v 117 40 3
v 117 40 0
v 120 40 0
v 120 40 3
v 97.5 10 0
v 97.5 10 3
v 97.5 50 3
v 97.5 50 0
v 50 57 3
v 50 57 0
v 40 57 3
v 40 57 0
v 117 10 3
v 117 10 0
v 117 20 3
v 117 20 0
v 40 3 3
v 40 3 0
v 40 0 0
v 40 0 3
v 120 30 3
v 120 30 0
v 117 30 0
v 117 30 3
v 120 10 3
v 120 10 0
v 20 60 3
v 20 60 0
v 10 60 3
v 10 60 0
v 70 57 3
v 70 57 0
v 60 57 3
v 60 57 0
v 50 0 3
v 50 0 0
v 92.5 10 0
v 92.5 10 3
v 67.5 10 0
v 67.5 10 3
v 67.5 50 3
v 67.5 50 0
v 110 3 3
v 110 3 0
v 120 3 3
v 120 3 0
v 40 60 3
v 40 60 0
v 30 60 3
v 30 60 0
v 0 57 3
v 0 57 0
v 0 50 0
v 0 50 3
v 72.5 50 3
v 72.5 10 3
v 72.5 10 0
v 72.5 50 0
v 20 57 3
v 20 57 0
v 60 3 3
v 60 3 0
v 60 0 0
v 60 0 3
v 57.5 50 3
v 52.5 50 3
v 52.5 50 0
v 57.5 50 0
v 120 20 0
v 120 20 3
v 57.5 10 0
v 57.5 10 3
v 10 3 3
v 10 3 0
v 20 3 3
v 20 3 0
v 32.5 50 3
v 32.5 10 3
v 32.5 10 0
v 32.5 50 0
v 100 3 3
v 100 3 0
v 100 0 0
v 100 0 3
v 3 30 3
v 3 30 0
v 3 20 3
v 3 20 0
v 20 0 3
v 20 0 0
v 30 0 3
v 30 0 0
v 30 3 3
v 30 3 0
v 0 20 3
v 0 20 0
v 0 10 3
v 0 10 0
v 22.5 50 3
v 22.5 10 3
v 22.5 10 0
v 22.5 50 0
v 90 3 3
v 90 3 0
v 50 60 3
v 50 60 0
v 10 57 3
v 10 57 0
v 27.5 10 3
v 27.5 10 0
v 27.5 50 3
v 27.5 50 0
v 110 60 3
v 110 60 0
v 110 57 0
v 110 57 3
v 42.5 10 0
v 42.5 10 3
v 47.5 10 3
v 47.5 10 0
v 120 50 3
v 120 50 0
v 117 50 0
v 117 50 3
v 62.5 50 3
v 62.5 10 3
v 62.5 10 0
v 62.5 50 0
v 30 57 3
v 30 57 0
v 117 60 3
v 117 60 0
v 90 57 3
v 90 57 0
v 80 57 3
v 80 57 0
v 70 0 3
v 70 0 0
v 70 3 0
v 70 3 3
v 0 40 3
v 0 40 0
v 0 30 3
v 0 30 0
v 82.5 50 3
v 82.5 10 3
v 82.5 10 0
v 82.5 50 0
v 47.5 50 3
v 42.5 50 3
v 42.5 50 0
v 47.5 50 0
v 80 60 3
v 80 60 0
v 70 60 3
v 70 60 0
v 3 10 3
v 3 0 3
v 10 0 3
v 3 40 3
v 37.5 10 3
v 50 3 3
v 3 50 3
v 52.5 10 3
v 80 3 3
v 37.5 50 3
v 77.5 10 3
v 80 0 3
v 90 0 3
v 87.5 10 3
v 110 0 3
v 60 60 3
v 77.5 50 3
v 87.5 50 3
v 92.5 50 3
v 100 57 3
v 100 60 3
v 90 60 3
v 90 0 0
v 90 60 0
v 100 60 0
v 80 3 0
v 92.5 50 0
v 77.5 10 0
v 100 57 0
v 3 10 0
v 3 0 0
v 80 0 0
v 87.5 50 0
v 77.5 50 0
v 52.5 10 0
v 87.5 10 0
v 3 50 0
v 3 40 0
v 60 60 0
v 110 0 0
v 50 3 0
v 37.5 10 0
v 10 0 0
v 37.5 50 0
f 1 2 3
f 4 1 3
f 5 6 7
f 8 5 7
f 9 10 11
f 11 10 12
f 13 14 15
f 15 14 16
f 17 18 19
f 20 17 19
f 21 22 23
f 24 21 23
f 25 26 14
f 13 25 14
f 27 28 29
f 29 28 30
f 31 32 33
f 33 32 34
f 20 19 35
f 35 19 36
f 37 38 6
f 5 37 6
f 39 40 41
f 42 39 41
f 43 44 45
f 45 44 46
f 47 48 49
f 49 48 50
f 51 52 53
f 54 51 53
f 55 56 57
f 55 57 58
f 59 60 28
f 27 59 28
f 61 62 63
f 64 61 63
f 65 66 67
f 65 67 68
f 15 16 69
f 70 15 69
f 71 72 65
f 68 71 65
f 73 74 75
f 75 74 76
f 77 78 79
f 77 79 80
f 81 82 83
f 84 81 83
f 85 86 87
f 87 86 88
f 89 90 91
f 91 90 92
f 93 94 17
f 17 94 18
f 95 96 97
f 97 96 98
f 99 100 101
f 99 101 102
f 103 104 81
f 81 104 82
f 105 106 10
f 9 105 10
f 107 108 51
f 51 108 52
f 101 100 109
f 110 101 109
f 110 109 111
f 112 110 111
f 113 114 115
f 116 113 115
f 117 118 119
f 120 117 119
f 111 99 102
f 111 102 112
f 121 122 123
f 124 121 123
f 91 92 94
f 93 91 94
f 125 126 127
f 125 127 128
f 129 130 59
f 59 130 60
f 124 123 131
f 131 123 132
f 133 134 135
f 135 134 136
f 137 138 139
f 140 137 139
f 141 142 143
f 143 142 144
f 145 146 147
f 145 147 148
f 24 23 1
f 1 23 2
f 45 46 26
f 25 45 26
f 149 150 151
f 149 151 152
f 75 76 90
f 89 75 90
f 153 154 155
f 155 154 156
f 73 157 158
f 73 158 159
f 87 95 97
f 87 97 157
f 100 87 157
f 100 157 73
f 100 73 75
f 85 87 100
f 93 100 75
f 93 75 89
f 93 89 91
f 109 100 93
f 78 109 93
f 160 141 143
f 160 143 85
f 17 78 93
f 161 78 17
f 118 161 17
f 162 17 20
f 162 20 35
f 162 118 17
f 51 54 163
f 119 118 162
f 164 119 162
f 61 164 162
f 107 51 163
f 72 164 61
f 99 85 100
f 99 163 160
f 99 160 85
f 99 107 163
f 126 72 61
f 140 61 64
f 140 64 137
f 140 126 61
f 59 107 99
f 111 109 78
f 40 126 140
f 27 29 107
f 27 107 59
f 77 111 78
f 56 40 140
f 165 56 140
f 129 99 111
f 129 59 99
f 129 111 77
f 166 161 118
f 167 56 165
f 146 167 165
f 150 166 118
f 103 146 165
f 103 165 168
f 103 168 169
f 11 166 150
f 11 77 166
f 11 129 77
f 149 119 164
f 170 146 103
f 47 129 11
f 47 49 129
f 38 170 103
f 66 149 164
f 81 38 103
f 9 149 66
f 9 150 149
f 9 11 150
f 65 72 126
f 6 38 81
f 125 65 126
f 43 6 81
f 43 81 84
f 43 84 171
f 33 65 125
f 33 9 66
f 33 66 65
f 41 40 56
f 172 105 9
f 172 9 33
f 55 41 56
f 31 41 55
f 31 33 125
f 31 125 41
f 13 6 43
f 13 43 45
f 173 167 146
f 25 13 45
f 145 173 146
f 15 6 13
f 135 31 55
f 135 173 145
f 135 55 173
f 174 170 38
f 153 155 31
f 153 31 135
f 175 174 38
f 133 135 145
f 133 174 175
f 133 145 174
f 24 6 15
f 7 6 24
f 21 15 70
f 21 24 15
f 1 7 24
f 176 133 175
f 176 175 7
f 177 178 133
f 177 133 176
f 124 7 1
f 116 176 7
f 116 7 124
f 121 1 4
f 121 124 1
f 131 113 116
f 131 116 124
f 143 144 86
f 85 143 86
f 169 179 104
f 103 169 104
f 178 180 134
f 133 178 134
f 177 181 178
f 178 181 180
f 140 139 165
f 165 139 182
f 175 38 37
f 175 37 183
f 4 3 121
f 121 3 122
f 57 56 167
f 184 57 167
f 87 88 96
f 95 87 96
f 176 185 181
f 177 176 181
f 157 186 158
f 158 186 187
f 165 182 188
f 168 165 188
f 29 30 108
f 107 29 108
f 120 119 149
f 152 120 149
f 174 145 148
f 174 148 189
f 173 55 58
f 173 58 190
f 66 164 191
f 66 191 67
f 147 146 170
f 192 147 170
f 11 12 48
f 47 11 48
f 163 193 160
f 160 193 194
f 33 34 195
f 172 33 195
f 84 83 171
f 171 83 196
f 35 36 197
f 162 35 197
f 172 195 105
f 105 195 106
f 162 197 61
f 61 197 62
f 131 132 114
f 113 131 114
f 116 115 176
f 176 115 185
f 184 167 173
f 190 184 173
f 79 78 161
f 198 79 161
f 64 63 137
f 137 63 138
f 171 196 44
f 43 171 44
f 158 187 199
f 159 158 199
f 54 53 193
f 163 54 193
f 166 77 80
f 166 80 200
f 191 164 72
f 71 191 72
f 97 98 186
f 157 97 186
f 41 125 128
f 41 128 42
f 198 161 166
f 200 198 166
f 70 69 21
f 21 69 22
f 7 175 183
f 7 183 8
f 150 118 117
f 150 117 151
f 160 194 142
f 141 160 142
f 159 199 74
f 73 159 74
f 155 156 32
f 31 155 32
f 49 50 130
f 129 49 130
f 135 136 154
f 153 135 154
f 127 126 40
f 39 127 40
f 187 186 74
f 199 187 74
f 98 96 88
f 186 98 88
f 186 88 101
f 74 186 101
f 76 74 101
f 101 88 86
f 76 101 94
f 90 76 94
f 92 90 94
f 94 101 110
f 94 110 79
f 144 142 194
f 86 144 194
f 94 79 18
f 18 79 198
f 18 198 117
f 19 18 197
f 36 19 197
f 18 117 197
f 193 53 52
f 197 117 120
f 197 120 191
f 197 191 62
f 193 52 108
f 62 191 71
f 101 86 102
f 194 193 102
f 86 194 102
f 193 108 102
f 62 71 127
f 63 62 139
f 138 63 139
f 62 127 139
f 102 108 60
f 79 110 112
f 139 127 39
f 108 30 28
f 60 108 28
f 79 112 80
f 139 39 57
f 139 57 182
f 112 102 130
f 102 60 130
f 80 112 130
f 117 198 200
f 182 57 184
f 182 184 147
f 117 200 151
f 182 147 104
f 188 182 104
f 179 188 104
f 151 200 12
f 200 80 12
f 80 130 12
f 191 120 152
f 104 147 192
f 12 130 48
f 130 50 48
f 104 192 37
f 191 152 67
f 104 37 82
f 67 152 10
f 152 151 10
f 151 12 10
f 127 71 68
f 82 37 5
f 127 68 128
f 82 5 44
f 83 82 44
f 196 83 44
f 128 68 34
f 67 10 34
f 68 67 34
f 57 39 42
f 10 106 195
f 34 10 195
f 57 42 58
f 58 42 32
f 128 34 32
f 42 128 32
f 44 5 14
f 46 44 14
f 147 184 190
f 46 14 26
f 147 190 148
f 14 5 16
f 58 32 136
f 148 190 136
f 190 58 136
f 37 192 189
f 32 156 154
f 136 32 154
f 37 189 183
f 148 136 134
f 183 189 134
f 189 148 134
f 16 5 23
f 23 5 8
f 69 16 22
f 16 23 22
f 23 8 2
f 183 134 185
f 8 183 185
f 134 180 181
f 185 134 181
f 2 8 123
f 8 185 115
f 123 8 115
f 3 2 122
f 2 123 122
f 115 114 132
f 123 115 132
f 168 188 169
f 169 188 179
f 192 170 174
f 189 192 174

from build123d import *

# Parameters (mm, degrees)
BOSS_EXTRUDE1_DEPTH = 3
SKETCH2_W           = 5
SKETCH2_H           = 40
CUT_EXTRUDE1_DEPTH  = 10


with BuildPart() as part:
    # Sketch1 → Boss-Extrude1 (new body)
    with BuildSketch(Plane.XY):
        Polygon((120, 3), (120, 10), (117, 10), (117, 20), (120, 20), (120, 30), (117, 30), (117, 40), (120, 40), (120, 50), (117, 50), (117, 60), (110, 60), (110, 57), (100, 57), (100, 60), (90, 60), (90, 57), (80, 57), (80, 60), (70, 60), (70, 57), (60, 57), (60, 60), (50, 60), (50, 57), (40, 57), (40, 60), (30, 60), (30, 57), (20, 57), (20, 60), (10, 60), (10, 57), (0, 57), (0, 50), (3, 50), (3, 40), (0, 40), (0, 30), (3, 30), (3, 20), (0, 20), (0, 10), (3, 10), (3, 0), (10, 0), (10, 3), (20, 3), (20, 0), (30, 0), (30, 3), (40, 3), (40, 0), (50, 0), (50, 3), (60, 3), (60, 0), (70, 0), (70, 3), (80, 3), (80, 0), (90, 0), (90, 3), (100, 3), (100, 0), (110, 0), (110, 3), align=None)
    extrude(amount=BOSS_EXTRUDE1_DEPTH)

    # Sketch2 → Cut-Extrude1 (cut)
    with BuildSketch(Plane.XY.offset(3)):
        with Locations((25, 30)):
            Rectangle(SKETCH2_W, SKETCH2_H)
        with Locations((35, 30)):
            Rectangle(SKETCH2_W, SKETCH2_H)
        with Locations((45, 30)):
            Rectangle(SKETCH2_W, SKETCH2_H)
        with Locations((55, 30)):
            Rectangle(SKETCH2_W, SKETCH2_H)
        with Locations((65, 30)):
            Rectangle(SKETCH2_W, SKETCH2_H)
        with Locations((75, 30)):
            Rectangle(SKETCH2_W, SKETCH2_H)
        with Locations((85, 30)):
            Rectangle(SKETCH2_W, SKETCH2_H)
        with Locations((95, 30)):
            Rectangle(SKETCH2_W, SKETCH2_H)
    extrude(amount=-CUT_EXTRUDE1_DEPTH, mode=Mode.SUBTRACT)


solid = part.part
